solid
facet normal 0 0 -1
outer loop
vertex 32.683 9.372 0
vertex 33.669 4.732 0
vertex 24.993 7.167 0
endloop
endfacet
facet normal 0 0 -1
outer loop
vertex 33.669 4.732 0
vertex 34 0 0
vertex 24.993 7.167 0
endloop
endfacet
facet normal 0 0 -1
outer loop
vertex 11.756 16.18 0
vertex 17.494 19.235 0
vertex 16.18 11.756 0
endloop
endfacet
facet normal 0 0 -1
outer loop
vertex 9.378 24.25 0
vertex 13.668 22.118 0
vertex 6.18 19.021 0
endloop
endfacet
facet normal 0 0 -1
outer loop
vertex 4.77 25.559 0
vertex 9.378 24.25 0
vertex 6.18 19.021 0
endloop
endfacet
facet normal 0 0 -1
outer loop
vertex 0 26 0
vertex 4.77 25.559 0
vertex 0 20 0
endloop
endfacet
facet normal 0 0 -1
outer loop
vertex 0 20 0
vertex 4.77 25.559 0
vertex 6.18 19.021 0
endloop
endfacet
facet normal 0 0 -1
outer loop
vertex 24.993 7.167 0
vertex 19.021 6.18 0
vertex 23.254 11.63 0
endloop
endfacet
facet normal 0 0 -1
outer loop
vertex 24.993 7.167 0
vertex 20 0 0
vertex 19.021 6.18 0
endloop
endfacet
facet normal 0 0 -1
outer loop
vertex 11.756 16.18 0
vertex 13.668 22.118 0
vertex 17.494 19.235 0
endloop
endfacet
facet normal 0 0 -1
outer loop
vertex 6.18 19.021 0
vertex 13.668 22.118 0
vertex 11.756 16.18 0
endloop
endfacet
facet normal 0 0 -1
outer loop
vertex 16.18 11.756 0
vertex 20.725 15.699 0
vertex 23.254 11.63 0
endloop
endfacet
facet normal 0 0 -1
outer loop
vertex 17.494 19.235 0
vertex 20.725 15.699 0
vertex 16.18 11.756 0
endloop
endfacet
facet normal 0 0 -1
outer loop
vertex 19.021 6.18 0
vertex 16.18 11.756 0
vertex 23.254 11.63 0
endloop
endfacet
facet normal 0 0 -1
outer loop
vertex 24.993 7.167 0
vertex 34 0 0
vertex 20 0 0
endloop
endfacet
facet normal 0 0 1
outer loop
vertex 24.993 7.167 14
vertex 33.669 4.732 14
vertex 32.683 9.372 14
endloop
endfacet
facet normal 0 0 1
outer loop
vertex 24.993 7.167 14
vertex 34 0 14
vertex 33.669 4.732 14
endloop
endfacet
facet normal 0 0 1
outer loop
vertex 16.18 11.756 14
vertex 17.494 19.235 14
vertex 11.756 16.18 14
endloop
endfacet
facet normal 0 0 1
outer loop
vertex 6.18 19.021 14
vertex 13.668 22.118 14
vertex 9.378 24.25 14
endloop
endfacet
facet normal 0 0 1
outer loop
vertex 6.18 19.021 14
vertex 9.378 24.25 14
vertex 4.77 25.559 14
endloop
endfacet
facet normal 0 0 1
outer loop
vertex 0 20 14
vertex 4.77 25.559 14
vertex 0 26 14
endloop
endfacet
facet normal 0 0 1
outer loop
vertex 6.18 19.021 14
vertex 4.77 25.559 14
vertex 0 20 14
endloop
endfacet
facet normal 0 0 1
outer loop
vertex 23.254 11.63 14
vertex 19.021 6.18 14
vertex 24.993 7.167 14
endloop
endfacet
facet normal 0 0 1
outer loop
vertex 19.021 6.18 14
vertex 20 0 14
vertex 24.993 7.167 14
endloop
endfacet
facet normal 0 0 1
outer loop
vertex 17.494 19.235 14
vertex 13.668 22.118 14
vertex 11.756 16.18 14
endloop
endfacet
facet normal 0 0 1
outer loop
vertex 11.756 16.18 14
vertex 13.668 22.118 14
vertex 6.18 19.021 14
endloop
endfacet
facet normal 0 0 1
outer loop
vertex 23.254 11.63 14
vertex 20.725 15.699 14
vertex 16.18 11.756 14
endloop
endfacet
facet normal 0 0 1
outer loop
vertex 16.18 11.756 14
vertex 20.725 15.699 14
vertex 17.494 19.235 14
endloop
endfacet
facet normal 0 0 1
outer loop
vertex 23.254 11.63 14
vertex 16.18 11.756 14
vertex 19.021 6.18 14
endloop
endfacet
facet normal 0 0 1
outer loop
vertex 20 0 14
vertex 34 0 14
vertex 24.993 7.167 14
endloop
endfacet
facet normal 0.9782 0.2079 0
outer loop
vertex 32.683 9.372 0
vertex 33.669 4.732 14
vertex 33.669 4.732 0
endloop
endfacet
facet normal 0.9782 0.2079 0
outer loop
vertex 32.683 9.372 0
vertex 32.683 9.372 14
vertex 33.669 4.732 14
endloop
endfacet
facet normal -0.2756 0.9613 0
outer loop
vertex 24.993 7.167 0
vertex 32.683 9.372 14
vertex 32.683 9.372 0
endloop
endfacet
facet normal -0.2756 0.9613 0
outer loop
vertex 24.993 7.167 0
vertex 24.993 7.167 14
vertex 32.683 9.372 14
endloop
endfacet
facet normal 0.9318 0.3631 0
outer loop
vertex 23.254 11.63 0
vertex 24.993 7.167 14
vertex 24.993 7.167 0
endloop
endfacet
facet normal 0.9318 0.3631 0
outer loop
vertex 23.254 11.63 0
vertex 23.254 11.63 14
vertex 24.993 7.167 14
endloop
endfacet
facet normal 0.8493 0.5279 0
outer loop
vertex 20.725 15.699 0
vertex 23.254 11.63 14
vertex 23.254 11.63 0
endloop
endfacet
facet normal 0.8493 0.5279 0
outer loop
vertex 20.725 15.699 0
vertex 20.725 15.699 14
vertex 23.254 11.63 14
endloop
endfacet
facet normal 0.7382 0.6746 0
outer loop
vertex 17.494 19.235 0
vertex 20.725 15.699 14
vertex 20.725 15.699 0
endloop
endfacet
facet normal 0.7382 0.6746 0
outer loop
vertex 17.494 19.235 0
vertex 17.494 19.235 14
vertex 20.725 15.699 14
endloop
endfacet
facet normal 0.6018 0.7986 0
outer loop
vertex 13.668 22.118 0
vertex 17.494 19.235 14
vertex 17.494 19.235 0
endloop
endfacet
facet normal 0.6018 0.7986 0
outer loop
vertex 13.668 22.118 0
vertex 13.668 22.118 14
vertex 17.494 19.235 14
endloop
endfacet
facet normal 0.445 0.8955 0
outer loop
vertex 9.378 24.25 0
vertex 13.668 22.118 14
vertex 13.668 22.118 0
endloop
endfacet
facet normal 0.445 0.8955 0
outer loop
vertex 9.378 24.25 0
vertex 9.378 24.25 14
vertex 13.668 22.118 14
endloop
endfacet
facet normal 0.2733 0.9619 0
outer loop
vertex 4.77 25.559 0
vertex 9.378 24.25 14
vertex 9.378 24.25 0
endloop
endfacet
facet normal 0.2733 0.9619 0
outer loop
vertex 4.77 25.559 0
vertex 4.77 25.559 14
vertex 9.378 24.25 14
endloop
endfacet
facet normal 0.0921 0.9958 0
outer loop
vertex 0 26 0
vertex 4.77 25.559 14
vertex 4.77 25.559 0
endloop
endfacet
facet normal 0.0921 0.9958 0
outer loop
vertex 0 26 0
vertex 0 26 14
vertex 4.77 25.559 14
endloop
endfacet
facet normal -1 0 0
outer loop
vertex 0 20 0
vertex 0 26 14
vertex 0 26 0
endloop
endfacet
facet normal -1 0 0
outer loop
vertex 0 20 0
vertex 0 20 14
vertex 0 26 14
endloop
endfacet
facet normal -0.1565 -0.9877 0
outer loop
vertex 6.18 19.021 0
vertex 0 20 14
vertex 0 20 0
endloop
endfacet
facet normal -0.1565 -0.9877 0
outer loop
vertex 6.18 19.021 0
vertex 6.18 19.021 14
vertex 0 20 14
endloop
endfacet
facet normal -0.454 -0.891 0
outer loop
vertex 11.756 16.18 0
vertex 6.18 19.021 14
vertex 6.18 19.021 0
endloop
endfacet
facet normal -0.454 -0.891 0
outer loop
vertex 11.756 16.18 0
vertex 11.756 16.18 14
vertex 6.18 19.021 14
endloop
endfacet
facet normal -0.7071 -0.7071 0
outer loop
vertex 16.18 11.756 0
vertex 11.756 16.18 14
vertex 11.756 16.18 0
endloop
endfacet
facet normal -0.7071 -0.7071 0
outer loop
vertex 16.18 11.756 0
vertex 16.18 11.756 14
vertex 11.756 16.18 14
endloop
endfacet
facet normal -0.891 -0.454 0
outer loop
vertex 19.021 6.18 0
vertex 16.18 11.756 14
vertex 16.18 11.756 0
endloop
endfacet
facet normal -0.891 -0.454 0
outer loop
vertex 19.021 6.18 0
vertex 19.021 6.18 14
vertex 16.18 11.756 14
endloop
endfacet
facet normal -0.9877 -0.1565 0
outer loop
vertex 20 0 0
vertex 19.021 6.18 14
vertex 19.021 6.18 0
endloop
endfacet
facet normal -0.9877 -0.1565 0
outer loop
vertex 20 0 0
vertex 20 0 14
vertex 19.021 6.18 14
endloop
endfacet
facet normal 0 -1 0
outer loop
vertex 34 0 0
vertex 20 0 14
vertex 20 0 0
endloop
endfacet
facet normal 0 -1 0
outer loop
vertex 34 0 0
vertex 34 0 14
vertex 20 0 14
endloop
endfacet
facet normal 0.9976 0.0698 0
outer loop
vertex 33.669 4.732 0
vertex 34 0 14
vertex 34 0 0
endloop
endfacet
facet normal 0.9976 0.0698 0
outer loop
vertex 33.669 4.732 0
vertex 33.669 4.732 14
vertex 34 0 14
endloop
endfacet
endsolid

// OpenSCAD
$fn = 32;

// ----------------------------------------------------------------------
// Arc stop: segment, 14 mm thick
// ----------------------------------------------------------------------

// --- parameters (mm) ---
profile_height = 14;      // extrusion height
profile_points = 17;      // points of the closed outline

profile = [[34, 0], [33.669, 4.732], [32.683, 9.372], [24.993, 7.167], [23.254, 11.63], [20.725, 15.699], [17.494, 19.235], [13.668, 22.118], [9.378, 24.25], [4.77, 25.559], [0, 26], [0, 20], [6.18, 19.021], [11.756, 16.18], [16.18, 11.756], [19.021, 6.18], [20, 0]];  // single closed polygon, 17 points, counter clockwise

// --- the one profile operation ---
linear_extrude(height = profile_height) polygon(points = profile);
